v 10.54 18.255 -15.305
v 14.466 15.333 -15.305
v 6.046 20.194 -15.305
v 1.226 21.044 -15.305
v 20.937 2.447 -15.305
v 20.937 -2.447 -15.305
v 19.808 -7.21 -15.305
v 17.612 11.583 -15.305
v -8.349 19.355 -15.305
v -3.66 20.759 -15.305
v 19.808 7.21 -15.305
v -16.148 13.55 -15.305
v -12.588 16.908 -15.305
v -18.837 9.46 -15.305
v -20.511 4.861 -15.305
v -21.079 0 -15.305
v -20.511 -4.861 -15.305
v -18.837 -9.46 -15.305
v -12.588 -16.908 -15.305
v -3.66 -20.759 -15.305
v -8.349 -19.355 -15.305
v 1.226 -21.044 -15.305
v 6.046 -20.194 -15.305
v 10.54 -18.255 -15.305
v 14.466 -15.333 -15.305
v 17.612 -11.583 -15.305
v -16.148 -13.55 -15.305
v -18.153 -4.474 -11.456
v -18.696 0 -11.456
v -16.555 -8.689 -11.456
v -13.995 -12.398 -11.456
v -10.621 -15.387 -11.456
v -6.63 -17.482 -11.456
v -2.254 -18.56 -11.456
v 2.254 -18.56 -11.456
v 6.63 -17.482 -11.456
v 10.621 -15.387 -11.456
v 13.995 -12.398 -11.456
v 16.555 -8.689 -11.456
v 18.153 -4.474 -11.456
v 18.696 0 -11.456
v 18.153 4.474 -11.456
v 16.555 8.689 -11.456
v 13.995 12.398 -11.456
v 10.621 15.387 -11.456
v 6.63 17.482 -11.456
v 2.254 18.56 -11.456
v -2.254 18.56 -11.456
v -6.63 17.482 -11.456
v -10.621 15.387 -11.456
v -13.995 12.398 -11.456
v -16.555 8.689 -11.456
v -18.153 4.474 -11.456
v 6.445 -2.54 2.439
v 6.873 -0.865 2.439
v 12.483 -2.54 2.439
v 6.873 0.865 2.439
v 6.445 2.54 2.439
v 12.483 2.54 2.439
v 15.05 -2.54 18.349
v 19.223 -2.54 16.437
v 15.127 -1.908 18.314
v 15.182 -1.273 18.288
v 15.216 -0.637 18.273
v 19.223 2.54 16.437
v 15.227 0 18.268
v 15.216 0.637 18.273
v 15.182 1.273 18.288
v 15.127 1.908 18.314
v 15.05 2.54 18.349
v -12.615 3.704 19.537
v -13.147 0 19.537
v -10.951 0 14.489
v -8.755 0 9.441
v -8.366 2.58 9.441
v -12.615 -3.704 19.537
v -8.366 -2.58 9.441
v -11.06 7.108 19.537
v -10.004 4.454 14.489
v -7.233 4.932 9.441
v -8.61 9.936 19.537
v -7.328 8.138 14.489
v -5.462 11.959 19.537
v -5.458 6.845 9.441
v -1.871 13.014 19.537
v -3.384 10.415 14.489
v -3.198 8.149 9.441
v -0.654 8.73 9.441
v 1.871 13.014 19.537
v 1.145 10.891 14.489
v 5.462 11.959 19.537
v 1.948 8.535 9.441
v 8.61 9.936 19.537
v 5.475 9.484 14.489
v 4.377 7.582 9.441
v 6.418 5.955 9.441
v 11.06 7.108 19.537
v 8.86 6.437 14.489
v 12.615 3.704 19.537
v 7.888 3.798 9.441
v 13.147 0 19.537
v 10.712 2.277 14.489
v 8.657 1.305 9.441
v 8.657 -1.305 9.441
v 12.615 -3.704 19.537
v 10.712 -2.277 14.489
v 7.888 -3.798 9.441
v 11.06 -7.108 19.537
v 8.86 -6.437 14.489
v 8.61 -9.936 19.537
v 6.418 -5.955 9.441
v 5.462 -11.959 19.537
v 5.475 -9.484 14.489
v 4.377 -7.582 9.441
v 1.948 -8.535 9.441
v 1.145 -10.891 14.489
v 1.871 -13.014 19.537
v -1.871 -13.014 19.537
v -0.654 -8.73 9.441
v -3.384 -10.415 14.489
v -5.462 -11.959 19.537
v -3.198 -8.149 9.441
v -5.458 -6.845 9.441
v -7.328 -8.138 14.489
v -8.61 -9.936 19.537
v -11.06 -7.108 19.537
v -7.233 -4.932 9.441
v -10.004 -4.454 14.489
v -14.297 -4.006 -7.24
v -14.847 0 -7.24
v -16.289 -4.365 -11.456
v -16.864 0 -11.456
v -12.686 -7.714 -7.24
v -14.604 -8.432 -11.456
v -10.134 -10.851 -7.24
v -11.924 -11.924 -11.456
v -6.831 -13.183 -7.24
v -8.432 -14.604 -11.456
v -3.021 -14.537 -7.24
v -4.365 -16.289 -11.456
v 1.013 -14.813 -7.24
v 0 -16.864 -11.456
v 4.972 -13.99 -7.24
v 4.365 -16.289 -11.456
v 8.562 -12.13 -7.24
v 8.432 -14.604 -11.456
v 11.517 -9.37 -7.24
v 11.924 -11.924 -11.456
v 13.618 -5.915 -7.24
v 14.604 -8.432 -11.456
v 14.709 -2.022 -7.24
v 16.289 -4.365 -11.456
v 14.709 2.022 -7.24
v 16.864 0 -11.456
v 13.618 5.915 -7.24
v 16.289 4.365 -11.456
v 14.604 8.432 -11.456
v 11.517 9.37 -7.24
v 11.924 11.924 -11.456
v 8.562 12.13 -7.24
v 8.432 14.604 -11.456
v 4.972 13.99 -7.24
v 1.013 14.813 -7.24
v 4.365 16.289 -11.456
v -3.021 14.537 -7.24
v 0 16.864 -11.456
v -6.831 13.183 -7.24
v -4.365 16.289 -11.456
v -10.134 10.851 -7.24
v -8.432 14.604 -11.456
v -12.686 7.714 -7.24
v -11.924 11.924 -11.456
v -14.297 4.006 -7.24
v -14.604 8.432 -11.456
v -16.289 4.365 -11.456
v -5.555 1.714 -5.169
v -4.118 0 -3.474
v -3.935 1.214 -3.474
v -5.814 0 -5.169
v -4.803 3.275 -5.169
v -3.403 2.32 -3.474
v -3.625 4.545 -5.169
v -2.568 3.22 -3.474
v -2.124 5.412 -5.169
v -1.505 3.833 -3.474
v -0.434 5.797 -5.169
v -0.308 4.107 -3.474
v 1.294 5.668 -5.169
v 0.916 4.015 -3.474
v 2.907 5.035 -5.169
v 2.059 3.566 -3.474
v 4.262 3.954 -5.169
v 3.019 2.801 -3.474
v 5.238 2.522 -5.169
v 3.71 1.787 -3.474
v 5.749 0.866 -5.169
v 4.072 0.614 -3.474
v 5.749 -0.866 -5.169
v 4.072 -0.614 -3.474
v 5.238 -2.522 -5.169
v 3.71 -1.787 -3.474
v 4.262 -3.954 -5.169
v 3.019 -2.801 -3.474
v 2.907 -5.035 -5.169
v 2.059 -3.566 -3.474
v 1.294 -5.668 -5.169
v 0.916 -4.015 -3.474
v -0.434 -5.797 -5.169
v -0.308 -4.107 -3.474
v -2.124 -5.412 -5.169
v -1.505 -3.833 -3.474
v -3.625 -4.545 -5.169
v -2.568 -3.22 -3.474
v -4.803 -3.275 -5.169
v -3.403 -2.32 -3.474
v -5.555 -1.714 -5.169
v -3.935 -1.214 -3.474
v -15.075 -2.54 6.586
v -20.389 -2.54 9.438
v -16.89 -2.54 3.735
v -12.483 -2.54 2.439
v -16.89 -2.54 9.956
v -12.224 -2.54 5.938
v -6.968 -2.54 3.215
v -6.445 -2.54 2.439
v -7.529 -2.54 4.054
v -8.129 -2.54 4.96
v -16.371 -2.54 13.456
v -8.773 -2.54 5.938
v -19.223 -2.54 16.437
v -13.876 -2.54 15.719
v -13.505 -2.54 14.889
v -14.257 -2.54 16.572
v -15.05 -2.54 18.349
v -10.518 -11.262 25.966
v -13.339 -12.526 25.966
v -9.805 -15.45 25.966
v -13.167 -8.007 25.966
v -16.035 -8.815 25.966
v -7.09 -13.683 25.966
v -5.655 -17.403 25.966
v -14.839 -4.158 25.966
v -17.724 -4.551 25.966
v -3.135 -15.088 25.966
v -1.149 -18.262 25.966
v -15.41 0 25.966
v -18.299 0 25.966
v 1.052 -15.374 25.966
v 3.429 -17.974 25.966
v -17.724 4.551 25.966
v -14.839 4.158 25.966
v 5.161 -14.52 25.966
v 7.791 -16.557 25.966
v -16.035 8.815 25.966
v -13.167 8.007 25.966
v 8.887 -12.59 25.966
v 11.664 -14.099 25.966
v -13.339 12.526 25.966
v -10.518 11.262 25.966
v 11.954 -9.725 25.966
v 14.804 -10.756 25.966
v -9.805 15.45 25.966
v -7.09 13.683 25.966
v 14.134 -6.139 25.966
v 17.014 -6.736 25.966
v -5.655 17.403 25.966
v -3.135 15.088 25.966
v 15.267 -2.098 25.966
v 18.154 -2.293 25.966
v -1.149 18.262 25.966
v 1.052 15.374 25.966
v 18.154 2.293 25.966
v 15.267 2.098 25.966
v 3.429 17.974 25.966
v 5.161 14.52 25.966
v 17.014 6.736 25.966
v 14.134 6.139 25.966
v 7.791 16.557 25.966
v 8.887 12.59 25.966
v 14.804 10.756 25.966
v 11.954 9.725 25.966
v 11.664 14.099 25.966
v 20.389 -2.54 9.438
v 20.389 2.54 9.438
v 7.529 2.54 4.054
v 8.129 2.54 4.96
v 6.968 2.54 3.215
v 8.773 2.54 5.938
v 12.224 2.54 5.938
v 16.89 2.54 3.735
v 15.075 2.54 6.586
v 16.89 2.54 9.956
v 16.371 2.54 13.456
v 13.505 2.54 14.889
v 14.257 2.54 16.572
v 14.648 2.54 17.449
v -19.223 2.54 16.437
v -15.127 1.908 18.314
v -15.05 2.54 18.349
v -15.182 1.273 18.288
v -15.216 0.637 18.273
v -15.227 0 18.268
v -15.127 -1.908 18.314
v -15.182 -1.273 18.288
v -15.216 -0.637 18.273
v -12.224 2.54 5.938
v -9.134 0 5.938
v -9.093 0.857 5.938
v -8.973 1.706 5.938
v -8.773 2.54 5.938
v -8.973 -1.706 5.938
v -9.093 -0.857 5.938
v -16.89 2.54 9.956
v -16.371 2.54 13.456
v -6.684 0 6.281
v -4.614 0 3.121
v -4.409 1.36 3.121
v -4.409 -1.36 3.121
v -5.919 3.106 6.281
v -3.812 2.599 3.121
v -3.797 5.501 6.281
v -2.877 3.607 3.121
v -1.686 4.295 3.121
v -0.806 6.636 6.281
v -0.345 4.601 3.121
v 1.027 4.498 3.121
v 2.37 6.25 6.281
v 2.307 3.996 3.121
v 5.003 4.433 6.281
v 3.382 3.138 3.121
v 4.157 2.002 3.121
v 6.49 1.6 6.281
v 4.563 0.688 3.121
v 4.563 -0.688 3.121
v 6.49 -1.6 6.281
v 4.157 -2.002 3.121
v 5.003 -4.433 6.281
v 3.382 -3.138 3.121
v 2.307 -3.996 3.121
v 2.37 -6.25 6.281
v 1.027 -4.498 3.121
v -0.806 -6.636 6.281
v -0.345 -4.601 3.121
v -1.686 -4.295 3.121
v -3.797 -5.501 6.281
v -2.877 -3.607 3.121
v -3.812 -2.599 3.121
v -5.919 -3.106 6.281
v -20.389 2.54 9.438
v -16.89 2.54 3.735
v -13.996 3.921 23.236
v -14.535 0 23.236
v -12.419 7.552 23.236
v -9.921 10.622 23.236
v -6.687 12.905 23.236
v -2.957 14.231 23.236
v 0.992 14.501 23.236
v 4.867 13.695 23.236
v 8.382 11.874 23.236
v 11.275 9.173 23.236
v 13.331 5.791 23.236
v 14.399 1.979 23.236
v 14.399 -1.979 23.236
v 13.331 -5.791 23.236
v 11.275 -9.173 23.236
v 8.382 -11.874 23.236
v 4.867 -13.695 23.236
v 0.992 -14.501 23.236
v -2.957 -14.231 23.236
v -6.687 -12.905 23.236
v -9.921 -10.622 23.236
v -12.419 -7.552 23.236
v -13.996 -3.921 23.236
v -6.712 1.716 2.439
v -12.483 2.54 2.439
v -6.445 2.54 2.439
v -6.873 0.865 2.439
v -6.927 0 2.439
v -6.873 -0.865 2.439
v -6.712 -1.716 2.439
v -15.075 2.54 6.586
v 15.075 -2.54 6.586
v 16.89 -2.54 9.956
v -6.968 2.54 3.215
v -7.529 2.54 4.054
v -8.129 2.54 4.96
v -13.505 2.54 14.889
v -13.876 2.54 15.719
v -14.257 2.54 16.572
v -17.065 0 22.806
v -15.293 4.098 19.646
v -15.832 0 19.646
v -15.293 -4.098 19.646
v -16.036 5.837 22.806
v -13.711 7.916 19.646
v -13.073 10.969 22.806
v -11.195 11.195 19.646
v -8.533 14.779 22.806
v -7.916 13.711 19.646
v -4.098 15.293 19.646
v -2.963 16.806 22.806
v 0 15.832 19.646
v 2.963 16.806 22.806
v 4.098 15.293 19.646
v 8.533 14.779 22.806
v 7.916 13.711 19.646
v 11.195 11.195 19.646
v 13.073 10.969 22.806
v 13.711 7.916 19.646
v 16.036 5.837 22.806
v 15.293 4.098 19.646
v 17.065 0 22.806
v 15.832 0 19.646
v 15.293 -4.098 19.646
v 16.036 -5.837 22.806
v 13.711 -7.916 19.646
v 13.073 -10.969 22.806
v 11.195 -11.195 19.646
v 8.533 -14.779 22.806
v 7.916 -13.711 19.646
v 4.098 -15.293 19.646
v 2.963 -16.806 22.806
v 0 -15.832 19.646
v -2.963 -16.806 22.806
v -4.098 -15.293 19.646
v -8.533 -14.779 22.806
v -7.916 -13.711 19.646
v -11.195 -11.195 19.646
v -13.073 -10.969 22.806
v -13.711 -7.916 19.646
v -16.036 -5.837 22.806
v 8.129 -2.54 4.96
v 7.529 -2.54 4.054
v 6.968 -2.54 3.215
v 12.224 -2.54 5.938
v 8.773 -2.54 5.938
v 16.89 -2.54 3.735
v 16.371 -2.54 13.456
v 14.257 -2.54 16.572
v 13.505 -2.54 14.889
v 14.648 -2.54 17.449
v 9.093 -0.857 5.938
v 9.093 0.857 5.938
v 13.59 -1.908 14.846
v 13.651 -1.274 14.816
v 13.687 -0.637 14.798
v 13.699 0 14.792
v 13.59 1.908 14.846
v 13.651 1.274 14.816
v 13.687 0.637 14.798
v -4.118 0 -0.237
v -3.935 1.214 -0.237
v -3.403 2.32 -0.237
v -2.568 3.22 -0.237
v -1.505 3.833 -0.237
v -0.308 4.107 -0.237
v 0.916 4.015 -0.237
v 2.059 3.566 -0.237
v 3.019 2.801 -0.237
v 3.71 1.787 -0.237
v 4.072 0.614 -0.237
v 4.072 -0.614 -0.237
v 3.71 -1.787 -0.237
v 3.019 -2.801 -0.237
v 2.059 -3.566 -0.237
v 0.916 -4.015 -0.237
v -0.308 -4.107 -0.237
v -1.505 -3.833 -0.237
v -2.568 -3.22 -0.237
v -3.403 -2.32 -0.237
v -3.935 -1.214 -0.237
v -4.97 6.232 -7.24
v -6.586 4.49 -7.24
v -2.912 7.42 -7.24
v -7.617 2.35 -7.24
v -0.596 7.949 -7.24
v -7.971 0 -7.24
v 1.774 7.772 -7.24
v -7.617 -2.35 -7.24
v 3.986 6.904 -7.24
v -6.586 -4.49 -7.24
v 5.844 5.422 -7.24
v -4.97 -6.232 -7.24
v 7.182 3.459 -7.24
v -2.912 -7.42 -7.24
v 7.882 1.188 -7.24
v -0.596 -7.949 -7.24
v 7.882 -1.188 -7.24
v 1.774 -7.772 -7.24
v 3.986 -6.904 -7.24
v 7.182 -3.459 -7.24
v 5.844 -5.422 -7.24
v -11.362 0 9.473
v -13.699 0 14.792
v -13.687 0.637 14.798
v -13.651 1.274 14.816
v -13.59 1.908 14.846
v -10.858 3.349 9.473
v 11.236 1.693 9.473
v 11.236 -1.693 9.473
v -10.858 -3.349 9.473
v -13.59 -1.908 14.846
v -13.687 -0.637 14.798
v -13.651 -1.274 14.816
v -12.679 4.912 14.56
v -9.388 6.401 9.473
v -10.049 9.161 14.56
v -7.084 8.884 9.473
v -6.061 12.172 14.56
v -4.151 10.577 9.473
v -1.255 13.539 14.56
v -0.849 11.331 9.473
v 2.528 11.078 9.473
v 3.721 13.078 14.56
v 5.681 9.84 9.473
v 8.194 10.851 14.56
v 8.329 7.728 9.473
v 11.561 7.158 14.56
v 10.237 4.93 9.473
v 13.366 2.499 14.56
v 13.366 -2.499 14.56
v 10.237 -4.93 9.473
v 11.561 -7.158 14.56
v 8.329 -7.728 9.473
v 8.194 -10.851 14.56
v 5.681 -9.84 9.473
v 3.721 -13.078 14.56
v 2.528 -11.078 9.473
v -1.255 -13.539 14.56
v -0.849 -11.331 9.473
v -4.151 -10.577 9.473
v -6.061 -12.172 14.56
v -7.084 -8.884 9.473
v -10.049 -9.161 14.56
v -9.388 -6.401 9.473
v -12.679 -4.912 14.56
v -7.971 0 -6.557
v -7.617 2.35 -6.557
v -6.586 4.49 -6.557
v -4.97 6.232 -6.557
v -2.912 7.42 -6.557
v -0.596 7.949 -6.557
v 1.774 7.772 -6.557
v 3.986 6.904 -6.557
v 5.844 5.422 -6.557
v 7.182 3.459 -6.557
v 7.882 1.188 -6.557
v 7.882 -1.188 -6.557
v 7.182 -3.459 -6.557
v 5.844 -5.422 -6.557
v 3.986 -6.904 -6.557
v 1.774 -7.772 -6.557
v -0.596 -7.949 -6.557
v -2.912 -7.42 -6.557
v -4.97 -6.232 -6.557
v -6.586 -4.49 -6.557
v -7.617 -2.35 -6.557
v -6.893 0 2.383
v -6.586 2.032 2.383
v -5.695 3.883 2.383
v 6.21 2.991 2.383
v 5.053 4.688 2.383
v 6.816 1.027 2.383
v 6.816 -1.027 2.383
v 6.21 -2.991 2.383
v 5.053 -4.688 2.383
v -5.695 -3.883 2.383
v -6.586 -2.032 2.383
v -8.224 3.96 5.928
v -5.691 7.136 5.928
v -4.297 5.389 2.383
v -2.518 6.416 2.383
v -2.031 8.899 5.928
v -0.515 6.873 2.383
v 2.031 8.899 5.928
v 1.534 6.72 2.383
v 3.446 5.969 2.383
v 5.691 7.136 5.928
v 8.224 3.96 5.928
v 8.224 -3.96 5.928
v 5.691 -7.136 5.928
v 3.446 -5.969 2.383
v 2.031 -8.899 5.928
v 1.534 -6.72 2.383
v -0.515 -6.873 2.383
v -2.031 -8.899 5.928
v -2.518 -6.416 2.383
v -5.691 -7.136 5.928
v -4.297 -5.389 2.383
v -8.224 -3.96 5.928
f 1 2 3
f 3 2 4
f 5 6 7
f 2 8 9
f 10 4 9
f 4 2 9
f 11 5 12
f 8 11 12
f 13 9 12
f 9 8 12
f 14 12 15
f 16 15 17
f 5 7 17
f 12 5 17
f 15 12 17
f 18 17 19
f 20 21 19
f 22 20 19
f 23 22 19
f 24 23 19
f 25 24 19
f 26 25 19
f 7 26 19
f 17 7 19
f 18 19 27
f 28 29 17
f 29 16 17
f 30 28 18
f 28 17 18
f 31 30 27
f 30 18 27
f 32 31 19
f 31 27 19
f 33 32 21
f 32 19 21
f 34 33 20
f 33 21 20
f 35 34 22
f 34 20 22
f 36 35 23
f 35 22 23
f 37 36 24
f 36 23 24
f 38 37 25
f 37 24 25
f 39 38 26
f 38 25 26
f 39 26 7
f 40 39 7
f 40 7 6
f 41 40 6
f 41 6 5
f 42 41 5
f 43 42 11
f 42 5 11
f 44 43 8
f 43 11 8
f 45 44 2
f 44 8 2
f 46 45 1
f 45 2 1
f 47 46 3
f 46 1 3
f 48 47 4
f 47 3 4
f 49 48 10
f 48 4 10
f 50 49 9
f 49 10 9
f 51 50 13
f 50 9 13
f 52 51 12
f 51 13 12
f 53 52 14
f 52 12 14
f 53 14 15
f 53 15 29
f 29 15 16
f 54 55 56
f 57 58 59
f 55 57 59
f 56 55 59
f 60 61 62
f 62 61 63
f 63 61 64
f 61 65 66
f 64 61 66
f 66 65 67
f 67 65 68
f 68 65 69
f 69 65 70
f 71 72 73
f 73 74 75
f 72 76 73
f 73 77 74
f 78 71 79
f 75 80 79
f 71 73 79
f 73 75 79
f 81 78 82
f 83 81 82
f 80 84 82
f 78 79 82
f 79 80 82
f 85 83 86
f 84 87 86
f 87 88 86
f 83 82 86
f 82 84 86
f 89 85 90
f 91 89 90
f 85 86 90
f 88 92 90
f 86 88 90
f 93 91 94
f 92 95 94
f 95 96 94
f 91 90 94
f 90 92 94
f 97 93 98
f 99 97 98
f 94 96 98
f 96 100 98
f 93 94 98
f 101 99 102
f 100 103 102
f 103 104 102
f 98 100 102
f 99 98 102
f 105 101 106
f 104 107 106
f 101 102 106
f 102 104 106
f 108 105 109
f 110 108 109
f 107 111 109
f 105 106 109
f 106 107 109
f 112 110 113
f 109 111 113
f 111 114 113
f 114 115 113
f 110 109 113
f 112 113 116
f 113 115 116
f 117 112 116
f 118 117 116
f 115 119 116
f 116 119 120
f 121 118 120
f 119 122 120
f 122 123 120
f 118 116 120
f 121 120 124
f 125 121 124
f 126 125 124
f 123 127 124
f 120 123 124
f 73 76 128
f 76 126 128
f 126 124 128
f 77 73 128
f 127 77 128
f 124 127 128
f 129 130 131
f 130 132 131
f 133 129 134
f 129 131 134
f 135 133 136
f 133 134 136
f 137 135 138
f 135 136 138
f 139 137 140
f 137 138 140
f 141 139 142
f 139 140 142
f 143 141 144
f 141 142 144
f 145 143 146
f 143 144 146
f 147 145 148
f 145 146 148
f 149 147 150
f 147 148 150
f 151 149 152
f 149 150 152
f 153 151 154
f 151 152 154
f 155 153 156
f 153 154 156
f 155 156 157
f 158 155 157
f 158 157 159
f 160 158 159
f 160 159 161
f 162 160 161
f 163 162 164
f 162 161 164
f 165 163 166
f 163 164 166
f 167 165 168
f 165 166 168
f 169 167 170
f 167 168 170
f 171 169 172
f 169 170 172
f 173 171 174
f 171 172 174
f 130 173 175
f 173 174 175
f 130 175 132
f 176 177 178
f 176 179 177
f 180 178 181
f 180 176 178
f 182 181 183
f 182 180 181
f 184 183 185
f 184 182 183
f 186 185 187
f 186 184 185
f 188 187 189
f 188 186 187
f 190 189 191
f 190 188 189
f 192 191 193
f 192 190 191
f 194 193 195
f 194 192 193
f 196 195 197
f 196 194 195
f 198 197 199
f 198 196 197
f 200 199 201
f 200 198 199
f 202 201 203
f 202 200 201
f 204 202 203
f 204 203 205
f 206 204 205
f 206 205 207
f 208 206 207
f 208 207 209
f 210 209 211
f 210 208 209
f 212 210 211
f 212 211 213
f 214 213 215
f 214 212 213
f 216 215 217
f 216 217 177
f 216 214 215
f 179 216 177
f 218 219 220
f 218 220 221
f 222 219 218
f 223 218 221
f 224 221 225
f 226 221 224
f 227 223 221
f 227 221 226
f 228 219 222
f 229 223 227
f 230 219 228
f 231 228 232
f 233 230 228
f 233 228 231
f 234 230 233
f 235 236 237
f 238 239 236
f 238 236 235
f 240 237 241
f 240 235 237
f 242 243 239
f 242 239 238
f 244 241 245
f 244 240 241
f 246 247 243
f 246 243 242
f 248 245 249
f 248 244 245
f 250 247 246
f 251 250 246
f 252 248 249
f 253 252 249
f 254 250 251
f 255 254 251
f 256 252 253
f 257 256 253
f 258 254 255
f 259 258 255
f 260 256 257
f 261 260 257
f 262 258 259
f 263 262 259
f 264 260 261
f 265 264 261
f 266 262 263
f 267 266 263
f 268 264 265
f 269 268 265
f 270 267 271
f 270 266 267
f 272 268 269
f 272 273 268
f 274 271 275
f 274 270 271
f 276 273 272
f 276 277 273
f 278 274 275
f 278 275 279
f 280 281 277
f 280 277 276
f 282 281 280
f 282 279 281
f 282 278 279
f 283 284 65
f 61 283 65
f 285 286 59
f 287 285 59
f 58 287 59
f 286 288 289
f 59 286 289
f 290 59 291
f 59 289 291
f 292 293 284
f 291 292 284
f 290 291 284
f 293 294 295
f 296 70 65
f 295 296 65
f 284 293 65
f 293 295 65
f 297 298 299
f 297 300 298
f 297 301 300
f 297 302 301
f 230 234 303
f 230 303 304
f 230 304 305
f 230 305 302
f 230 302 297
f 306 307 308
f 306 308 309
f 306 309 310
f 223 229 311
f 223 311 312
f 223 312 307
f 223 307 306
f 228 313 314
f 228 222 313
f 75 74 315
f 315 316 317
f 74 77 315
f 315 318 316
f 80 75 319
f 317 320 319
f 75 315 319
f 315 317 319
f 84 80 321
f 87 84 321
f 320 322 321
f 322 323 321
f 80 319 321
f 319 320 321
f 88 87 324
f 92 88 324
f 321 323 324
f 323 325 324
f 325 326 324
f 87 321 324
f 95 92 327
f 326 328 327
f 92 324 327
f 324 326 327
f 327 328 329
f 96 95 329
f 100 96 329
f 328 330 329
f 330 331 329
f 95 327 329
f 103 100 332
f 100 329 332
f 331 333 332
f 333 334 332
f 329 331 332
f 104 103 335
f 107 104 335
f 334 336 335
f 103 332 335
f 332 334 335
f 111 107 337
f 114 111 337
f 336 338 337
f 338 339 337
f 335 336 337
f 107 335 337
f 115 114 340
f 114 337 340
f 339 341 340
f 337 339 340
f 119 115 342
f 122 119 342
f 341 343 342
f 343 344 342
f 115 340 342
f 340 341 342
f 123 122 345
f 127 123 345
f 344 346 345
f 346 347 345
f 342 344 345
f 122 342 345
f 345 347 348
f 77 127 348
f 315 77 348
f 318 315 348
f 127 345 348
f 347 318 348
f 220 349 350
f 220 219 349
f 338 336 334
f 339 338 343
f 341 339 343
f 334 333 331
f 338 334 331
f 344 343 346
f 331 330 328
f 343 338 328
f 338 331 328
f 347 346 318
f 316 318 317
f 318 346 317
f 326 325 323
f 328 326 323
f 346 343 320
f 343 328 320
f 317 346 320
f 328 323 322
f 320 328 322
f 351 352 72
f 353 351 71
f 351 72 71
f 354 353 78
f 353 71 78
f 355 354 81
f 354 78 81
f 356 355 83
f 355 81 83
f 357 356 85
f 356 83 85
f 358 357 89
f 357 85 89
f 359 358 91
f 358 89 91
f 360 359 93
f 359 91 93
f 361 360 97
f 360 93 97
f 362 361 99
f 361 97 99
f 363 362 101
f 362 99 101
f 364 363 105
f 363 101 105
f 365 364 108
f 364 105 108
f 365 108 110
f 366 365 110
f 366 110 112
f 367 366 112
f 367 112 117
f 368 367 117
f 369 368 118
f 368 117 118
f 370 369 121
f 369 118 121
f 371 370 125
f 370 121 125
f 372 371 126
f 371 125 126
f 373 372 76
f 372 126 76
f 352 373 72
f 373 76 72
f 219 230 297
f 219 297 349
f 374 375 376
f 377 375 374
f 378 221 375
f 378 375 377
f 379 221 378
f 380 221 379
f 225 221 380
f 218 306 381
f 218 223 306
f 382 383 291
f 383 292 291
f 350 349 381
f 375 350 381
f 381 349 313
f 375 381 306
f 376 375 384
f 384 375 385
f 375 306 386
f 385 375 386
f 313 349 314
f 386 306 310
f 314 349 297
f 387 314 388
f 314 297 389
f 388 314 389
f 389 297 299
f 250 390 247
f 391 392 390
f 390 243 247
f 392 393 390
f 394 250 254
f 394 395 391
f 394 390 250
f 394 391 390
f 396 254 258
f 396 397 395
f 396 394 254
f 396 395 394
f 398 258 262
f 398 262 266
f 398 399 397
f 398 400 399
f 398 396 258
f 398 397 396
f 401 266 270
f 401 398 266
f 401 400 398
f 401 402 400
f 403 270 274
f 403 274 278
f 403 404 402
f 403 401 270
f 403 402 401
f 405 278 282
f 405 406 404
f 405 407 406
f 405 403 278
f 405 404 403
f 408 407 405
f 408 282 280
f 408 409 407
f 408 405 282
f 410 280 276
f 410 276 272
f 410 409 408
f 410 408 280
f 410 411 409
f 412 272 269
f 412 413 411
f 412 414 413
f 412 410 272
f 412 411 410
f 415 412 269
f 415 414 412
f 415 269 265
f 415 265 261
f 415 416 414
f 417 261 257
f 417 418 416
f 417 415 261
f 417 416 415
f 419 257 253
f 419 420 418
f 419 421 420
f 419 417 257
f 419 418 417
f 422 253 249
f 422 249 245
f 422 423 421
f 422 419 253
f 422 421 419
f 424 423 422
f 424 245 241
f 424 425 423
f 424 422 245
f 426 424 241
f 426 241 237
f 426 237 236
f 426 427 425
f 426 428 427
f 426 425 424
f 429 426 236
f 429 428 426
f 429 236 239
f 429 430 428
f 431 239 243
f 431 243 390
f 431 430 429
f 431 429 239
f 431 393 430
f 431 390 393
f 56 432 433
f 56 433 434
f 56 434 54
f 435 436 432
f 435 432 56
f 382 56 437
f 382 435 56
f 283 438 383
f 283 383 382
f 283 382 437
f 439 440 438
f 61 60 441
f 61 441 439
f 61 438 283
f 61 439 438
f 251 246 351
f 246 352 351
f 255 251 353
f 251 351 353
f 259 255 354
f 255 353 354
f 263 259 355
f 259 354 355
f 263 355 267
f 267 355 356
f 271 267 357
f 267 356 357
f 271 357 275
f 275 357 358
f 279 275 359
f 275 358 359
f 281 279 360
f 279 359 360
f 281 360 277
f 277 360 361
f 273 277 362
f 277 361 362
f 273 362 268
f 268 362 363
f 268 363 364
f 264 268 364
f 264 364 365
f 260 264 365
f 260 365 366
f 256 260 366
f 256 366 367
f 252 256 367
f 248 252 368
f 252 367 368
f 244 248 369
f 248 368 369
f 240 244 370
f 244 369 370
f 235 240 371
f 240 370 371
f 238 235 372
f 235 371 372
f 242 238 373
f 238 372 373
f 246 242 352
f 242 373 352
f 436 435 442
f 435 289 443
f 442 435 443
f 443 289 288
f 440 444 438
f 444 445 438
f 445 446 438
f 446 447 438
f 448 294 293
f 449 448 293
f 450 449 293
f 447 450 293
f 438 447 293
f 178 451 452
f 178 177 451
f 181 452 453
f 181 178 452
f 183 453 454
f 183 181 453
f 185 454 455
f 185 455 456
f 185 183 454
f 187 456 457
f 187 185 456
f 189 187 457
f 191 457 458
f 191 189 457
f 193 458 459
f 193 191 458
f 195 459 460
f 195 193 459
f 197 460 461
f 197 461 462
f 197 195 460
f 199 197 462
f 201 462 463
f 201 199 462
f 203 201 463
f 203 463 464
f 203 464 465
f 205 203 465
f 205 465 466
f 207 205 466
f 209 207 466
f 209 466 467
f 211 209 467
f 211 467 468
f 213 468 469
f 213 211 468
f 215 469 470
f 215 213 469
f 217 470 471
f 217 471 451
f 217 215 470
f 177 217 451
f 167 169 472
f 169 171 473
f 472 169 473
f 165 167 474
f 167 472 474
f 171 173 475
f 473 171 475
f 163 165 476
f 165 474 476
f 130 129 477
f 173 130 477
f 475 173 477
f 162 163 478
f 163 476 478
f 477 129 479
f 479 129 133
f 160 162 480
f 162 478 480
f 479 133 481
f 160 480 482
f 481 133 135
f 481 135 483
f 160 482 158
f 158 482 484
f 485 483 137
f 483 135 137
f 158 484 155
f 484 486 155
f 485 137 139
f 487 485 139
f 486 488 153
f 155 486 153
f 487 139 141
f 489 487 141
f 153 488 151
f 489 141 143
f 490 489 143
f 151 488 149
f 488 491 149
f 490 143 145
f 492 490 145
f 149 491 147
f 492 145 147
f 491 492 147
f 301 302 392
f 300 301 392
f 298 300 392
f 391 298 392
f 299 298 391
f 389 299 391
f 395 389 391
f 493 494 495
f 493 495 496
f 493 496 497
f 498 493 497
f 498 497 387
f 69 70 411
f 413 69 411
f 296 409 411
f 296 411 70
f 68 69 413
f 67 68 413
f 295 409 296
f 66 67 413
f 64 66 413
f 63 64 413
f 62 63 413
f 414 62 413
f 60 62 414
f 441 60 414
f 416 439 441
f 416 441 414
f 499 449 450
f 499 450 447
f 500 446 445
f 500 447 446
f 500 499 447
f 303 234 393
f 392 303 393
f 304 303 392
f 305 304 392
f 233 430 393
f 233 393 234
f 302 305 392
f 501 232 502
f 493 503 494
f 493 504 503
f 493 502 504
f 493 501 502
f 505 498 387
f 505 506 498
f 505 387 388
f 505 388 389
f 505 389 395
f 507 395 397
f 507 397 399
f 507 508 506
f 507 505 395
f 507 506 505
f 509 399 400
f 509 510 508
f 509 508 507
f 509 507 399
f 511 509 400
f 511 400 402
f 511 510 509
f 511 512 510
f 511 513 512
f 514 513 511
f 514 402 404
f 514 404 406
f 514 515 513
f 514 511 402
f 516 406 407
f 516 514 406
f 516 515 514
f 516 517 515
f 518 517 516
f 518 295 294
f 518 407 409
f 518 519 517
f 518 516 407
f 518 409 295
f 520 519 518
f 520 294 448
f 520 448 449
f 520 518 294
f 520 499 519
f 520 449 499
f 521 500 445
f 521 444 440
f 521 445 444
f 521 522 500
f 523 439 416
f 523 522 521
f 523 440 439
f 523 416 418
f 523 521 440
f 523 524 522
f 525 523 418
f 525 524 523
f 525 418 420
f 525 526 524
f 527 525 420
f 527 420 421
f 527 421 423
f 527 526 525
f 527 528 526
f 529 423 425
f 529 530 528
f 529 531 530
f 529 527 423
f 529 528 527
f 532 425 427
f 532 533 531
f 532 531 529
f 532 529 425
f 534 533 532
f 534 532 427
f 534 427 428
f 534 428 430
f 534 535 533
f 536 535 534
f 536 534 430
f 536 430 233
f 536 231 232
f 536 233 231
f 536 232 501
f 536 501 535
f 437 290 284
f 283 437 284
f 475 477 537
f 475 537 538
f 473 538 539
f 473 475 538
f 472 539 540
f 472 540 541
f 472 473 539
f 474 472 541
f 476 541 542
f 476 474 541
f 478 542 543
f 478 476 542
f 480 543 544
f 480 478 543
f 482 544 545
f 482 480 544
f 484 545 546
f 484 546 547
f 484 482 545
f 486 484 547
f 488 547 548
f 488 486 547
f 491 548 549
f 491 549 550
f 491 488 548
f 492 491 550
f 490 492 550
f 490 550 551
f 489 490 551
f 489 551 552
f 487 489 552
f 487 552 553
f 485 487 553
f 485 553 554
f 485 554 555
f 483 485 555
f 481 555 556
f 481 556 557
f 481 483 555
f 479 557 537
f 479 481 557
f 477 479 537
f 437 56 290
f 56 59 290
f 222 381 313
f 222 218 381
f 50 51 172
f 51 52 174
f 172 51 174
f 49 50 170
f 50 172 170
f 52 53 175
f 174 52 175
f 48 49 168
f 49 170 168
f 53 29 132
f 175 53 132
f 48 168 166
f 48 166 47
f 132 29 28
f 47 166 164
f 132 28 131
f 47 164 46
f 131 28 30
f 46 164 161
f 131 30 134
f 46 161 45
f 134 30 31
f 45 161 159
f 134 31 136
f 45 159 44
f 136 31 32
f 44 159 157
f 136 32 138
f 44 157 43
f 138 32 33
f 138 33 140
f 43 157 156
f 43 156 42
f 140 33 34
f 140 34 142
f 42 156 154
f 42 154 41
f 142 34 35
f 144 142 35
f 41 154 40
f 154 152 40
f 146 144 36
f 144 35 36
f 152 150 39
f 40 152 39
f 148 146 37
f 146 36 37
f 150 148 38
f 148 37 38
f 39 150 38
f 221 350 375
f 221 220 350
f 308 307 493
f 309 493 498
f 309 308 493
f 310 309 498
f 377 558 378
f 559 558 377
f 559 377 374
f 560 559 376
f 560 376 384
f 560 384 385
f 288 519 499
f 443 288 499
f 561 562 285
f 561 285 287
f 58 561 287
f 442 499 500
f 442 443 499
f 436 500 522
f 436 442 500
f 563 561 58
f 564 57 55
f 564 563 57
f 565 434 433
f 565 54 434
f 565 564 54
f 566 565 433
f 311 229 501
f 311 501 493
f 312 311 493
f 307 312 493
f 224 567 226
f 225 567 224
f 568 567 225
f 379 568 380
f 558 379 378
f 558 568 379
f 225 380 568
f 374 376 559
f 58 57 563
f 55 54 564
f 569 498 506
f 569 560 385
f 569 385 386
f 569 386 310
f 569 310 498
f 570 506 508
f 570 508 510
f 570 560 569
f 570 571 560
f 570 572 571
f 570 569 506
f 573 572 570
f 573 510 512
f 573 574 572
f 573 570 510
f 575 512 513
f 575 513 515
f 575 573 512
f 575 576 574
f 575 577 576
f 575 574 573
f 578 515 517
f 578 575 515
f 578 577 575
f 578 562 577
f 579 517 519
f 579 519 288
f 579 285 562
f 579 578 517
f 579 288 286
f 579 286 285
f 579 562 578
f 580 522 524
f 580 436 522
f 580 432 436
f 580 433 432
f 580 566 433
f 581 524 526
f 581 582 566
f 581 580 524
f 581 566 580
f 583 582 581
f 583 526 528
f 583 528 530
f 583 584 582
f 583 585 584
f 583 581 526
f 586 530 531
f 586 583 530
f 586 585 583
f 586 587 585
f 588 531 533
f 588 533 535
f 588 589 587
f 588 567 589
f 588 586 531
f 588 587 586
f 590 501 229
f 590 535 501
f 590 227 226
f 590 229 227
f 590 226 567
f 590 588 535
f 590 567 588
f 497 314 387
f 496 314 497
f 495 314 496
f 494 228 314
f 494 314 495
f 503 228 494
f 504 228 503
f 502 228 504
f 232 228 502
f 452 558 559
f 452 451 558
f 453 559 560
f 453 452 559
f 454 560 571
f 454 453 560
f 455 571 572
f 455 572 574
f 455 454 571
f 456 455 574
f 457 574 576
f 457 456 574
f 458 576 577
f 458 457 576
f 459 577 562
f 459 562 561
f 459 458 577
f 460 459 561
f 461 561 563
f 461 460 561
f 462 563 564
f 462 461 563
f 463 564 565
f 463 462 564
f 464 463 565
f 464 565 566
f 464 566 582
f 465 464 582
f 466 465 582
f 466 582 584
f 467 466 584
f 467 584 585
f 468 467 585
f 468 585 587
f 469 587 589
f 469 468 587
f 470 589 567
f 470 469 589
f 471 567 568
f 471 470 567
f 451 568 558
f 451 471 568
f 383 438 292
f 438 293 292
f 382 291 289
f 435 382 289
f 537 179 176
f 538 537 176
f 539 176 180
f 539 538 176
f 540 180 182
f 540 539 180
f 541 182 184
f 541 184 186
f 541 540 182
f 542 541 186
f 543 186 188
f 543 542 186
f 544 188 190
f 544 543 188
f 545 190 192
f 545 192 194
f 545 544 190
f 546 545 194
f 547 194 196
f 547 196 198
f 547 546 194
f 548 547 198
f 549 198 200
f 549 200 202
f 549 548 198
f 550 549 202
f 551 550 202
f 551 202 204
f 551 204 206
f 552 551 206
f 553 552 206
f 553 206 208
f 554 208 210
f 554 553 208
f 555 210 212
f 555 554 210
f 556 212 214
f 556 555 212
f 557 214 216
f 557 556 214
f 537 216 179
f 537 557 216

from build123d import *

# Parameters (mm, degrees)
F5_DEPTH = 2.54
F6_DEPTH = 2.54


with BuildPart() as f1:
    # F0 (on Front) → F1 (revolve)
    with BuildSketch(Plane.XZ):
        Polygon((0, -15.305464), (0, -7.240309), (-14.847217, -7.240309), (-16.863504, -11.456186), (-18.696494, -11.456186), (-21.079382, -15.305464), align=None)
    revolve(axis=Axis((0, 0, -11.272887), (0, 0, 1)))

    # F2 (on Front) → F3 (revolve)
    with BuildSketch(Plane.XZ):
        Polygon((-4.272232, -7.943824), (0, -7.943824), (0, 25.965976), (-18.298559, 25.965976), (-15.832391, 19.646421), (-11.362462, 9.473482), (-6.892534, 2.383251), (-4.118097, -0.237052), (-4.118097, -3.473896), (-5.813586, -5.169386), (-7.971482, -6.556605), (-7.971482, -7.943824), align=None)
    revolve(axis=Axis((0, 0, 9.011076), (0, 0, -1)))

    # F4 (on Front) → F5 (join)
    with BuildSketch(Plane.XZ):
        Polygon((-16.37111, 13.455632), (-11.964304, 15.659036), (-13.0012, 19.288169), (-19.222574, 16.436707), (-20.389082, 9.437662), (-16.889559, 3.734736), (-12.482752, 2.438617), (-4.576424, 2.438617), (-4.576424, 3.99396), (-7.168663, 5.938139), (-12.223529, 5.938139), (-15.074992, 6.586199), (-16.889559, 9.956109), align=None)
        Polygon((16.889559, 9.956109), (15.074992, 6.586199), (12.223529, 5.938139), (7.168663, 5.938139), (4.576424, 3.99396), (4.576424, 2.438617), (12.482752, 2.438617), (16.889559, 3.734736), (20.389082, 9.437662), (19.222574, 16.436707), (13.0012, 19.288169), (11.964304, 15.659036), (16.37111, 13.455632), align=None)
    extrude(amount=F5_DEPTH)

    # F4 (on Front) → F6 (join)
    with BuildSketch(Plane.XZ):
        Polygon((-16.37111, 13.455632), (-11.964304, 15.659036), (-13.0012, 19.288169), (-19.222574, 16.436707), (-20.389082, 9.437662), (-16.889559, 3.734736), (-12.482752, 2.438617), (-4.576424, 2.438617), (-4.576424, 3.99396), (-7.168663, 5.938139), (-12.223529, 5.938139), (-15.074992, 6.586199), (-16.889559, 9.956109), align=None)
        Polygon((16.889559, 9.956109), (15.074992, 6.586199), (12.223529, 5.938139), (7.168663, 5.938139), (4.576424, 3.99396), (4.576424, 2.438617), (12.482752, 2.438617), (16.889559, 3.734736), (20.389082, 9.437662), (19.222574, 16.436707), (13.0012, 19.288169), (11.964304, 15.659036), (16.37111, 13.455632), align=None)
    extrude(amount=-F6_DEPTH)

    # F7 (on Front) → F8 (revolve, cut)
    with BuildSketch(Plane.XZ):
        Polygon((0, 3.12148), (0, 23.313222), (0, 27.320744), (-15.84477, 27.320744), (-14.53462, 23.236156), (-13.147401, 19.536905), (-8.75454, 9.441033), (-4.614143, 3.12148), align=None)
    revolve(axis=Axis((0, 0, 15.221112), (0, 0, -1)), mode=Mode.SUBTRACT)


solid = f1.part
